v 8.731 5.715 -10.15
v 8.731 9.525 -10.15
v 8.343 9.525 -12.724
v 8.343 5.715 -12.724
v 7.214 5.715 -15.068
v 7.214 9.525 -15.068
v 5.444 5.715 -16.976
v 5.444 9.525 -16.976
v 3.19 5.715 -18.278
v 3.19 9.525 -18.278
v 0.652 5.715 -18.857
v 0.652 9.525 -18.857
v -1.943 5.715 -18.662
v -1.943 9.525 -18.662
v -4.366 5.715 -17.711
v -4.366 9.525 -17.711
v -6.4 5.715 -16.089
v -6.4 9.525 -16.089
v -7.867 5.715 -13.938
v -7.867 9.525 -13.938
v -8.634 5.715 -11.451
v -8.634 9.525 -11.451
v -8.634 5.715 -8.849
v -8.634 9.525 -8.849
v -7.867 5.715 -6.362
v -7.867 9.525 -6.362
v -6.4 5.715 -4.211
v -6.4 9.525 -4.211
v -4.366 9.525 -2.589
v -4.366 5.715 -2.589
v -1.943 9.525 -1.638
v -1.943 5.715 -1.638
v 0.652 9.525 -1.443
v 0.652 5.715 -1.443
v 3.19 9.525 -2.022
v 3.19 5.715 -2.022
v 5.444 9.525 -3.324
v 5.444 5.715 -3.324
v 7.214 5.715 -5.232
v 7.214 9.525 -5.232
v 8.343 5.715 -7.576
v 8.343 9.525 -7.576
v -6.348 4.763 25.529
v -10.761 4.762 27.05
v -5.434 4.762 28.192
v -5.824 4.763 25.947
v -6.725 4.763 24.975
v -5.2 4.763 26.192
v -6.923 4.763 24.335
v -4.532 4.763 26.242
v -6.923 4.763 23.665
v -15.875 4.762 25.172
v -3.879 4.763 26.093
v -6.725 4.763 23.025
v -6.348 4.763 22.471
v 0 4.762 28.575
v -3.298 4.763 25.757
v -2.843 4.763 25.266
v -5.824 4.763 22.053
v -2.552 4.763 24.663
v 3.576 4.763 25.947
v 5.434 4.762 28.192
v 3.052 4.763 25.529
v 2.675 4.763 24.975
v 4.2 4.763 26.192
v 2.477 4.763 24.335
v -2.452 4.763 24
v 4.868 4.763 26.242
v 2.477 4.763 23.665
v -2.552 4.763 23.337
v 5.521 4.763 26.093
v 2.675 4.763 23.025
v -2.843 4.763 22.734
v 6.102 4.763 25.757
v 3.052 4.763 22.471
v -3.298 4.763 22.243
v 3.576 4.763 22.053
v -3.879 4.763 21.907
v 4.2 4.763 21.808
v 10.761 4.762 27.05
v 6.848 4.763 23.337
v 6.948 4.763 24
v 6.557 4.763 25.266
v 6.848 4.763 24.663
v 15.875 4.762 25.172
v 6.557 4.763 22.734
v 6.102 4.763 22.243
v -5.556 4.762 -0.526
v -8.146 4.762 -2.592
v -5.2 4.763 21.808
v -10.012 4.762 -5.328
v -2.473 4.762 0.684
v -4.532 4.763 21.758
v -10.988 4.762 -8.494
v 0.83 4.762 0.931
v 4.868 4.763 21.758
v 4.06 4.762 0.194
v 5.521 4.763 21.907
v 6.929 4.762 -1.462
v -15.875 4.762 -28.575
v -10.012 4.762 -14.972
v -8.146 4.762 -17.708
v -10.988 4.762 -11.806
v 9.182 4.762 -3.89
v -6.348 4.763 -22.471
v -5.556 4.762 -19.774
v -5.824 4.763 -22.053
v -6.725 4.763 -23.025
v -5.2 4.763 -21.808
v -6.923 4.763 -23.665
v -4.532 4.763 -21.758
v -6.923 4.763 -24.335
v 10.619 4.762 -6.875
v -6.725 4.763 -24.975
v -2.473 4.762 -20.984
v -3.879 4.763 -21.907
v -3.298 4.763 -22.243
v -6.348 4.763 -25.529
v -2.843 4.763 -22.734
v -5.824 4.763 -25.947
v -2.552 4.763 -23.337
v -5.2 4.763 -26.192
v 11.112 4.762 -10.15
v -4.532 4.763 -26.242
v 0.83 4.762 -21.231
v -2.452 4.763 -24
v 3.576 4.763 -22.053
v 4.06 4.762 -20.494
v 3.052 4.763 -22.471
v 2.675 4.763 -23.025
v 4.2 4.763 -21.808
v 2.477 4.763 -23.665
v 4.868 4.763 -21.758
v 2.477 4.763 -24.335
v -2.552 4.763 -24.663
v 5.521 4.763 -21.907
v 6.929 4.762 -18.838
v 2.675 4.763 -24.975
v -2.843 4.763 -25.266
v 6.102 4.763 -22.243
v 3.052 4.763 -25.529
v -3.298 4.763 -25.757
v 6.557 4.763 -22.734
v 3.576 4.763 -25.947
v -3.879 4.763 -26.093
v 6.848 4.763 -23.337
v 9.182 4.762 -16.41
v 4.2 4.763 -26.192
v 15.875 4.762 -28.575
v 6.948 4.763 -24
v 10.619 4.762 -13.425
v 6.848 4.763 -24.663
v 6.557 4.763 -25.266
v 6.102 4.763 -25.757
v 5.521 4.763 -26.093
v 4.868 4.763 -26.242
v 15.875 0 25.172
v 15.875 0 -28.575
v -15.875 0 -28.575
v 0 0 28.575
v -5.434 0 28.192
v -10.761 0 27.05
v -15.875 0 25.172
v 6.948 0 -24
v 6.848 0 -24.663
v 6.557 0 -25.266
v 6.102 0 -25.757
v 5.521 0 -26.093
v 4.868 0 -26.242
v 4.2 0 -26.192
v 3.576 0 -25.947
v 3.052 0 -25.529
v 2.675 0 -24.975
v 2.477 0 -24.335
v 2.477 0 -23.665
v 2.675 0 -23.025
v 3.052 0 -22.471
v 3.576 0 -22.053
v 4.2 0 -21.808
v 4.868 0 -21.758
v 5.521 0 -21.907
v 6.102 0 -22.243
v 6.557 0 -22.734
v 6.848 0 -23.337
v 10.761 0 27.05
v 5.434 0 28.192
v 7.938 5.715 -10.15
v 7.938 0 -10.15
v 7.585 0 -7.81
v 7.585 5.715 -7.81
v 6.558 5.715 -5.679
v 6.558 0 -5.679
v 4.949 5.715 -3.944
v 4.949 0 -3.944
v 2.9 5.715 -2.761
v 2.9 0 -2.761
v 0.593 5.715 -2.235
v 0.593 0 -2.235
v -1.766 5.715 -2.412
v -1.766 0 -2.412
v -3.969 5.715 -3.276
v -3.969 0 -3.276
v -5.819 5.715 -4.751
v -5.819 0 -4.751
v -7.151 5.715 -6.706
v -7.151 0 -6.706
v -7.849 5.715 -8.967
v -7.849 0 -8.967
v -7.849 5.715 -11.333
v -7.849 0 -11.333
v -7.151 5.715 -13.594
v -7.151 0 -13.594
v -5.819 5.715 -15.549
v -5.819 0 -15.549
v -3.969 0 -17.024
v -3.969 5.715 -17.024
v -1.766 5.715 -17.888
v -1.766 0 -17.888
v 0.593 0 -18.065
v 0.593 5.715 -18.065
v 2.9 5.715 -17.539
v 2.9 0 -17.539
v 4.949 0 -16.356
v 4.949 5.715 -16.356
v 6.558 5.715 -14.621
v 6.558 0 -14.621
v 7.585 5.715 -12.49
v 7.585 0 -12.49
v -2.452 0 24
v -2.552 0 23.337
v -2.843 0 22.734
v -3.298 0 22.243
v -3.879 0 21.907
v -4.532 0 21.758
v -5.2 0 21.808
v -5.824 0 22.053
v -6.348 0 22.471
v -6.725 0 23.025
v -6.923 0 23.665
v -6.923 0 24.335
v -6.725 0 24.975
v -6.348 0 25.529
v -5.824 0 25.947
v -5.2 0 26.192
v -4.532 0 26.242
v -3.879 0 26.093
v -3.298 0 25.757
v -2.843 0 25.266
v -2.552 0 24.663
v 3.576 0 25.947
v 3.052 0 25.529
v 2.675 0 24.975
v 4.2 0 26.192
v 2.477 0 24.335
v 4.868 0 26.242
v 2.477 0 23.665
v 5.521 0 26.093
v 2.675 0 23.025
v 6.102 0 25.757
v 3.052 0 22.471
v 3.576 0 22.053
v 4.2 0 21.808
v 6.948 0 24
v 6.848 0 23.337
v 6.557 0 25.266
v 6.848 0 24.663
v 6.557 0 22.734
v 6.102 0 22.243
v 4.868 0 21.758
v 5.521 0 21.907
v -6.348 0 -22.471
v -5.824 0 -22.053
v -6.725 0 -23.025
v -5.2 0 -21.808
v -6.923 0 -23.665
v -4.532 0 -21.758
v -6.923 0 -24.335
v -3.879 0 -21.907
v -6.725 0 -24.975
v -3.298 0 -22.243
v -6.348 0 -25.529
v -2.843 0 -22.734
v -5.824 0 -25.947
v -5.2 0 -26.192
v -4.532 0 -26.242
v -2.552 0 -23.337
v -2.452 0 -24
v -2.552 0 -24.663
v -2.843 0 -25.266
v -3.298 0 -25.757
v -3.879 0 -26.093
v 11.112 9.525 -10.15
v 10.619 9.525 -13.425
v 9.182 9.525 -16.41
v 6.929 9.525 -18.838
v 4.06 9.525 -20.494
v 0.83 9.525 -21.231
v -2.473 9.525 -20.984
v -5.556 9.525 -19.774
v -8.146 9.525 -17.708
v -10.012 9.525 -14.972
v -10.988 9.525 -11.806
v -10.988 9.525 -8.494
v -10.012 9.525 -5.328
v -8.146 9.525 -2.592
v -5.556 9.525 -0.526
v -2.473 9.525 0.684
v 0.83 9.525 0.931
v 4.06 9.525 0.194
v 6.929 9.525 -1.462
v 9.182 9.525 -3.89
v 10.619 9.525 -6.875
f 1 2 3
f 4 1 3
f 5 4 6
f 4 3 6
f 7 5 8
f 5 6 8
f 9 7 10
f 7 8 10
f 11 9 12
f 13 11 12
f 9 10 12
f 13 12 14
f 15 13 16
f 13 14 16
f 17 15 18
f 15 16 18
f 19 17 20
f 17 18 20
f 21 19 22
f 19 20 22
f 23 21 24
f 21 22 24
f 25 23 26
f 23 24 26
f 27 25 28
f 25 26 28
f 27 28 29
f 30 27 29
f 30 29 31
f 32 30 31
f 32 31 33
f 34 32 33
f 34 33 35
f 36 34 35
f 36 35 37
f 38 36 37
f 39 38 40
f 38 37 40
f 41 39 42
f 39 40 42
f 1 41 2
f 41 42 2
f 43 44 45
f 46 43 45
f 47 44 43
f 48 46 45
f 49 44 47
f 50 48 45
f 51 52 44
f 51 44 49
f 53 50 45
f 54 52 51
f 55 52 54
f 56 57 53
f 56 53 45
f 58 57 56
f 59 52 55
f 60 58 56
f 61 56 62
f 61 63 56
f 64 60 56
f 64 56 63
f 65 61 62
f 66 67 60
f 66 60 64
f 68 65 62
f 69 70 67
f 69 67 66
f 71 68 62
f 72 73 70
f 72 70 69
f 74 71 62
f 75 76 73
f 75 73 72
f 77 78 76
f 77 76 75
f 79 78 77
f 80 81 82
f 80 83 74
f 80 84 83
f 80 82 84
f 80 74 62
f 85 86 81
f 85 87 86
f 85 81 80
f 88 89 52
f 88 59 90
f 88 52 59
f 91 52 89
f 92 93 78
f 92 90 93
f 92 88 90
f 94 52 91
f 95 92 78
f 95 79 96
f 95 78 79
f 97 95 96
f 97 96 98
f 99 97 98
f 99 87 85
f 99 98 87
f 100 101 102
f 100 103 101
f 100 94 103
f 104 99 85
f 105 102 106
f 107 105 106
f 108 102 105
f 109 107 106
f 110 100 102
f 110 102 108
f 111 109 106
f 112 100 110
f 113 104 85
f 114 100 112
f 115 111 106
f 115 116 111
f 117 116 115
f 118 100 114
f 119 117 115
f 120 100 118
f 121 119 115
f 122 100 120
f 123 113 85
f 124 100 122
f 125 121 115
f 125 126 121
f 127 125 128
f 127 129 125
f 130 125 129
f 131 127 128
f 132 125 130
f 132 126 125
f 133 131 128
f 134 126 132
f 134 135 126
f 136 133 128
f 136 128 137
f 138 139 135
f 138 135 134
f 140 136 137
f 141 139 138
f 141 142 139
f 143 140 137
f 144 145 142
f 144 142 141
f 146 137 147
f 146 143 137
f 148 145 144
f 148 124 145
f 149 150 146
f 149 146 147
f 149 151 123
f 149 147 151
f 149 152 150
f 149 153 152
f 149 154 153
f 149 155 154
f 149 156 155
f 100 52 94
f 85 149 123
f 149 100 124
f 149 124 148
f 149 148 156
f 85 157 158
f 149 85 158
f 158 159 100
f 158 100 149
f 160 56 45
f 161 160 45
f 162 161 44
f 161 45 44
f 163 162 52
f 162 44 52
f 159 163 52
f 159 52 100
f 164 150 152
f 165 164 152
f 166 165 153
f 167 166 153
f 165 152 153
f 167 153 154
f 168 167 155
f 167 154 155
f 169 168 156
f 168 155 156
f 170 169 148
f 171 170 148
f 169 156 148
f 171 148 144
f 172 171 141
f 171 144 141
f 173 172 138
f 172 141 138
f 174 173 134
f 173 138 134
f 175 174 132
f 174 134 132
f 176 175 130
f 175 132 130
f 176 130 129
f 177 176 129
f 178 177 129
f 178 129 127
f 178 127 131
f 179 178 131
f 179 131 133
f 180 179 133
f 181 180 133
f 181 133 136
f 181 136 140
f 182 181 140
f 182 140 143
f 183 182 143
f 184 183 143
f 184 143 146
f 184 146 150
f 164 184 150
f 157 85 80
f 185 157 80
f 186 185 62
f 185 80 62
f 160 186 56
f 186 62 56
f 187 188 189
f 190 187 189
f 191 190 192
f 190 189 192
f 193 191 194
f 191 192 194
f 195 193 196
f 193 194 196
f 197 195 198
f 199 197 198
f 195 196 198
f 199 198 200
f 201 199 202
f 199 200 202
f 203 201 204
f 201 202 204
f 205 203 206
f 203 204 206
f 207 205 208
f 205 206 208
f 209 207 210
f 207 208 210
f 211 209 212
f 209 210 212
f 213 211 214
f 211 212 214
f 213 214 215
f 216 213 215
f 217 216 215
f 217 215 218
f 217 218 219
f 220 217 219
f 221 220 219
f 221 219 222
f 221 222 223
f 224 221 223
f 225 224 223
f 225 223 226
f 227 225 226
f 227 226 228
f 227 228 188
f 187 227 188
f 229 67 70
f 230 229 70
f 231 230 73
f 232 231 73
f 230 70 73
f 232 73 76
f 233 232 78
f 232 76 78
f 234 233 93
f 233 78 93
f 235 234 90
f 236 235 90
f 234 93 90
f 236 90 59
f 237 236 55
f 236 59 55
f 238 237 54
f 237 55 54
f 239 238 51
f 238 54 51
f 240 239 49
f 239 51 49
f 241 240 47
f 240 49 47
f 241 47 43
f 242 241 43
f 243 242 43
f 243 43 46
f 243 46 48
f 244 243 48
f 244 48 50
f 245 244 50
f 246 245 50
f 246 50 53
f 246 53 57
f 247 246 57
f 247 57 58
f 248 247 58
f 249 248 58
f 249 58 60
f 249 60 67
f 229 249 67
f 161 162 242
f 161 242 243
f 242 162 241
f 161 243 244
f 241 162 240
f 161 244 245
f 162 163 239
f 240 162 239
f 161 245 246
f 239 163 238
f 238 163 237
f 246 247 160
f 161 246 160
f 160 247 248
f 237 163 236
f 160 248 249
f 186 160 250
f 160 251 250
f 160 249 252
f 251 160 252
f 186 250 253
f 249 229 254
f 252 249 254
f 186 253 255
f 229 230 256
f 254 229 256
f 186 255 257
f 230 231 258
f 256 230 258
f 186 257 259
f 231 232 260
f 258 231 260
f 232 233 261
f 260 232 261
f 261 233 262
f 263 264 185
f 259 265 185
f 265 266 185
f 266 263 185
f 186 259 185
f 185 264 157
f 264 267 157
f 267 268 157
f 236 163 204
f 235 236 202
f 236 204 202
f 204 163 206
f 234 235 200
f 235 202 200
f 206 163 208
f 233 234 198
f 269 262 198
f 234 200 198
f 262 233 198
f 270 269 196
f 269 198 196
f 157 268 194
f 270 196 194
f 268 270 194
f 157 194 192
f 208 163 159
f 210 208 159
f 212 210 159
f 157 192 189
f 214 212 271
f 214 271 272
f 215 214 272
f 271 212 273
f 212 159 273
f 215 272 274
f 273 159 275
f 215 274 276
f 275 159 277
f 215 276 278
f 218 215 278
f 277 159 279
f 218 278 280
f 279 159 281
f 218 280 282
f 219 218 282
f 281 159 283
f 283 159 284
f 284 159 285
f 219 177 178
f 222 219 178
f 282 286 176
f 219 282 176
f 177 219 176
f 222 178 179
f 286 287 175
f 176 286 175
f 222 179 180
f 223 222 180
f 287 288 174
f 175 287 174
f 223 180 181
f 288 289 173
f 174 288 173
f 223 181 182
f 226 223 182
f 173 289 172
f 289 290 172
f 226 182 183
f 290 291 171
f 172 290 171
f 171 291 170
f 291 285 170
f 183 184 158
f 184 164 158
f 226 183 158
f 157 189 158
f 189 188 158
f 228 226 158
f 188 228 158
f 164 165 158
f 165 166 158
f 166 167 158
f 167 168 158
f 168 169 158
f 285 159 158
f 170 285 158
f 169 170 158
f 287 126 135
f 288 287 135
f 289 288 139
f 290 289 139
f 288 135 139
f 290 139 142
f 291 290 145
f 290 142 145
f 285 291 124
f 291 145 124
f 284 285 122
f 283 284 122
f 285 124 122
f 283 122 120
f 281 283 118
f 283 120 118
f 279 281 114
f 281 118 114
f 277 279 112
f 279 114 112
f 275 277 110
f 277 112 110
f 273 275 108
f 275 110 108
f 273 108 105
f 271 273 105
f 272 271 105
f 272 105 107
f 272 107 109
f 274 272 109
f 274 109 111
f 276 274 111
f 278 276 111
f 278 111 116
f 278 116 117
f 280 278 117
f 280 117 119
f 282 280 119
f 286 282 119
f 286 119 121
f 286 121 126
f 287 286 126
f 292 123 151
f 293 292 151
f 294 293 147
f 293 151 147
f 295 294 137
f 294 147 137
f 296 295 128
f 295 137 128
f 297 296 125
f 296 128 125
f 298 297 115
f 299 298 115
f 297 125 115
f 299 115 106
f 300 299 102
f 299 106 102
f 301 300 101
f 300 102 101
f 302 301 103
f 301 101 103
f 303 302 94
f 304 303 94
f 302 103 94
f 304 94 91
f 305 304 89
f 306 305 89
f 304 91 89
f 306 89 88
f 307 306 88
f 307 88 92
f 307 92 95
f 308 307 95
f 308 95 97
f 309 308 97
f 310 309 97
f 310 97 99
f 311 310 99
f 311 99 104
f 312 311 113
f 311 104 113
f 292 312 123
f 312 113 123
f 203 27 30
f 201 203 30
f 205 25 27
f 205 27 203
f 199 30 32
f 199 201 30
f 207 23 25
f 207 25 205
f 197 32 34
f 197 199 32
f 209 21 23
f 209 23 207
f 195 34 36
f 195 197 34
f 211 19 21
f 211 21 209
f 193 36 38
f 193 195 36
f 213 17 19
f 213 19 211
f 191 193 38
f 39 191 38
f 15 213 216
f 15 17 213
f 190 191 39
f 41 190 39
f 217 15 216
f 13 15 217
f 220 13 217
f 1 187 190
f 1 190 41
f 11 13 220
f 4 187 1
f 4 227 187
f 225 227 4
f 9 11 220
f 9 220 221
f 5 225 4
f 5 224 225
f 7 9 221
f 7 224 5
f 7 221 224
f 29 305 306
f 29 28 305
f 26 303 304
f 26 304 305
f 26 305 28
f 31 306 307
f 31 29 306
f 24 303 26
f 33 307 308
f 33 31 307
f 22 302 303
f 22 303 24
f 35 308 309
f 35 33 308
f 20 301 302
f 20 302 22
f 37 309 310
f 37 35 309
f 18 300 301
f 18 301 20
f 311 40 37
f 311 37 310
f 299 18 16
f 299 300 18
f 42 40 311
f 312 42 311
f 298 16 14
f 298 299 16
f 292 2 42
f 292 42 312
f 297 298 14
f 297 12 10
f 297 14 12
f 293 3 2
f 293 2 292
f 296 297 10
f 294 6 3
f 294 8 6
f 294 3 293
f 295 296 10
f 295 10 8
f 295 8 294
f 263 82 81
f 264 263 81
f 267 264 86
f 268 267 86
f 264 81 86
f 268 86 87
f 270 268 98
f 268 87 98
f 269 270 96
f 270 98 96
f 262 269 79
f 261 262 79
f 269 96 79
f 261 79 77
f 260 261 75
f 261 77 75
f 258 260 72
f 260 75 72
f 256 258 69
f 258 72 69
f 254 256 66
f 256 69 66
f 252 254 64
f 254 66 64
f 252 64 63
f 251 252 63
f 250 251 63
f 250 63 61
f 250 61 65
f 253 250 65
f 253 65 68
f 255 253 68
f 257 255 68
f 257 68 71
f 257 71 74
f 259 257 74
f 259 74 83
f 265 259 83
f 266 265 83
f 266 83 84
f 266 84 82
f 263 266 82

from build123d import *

# Parameters (mm, degrees)
SKETCH1_W             = 31.75
SKETCH1_H             = 57.15
BOSS_EXTRUDE1_DEPTH   = 4.7625
SKETCH2_R             = 11.1125
BOSS_EXTRUDE2_DEPTH   = 4.7625
SKETCH3_R             = 8.73125
CUT_EXTRUDE1_DEPTH    = 3.81
SKETCH4_R             = 7.9375
CUT_EXTRUDE2_DEPTH    = 7.9375
F_8_CLEARANCE_HOLE2_D = 4.4958
CUT_EXTRUDE3_DEPTH    = 5.7625


with BuildPart() as part:
    # Sketch1 → Boss-Extrude1 (new body)
    with BuildSketch(Plane(origin=(0, 0, 0), x_dir=(1, 0, 0), z_dir=(0, 1, 0))):
        Rectangle(SKETCH1_W, SKETCH1_H)
    extrude(amount=BOSS_EXTRUDE1_DEPTH)

    # Sketch2 → Boss-Extrude2 (add)
    with BuildSketch(Plane(origin=(0, 4.7625, 0), x_dir=(1, 0, 0), z_dir=(0, 1, 0))):
        with Locations((0, 10.15000002)):
            Circle(SKETCH2_R)
    extrude(amount=BOSS_EXTRUDE2_DEPTH)

    # Sketch3 → Cut-Extrude1 (cut)
    with BuildSketch(Plane(origin=(0, 9.525, 0), x_dir=(1, 0, 0), z_dir=(0, 1, 0))):
        with Locations((0, 10.15000002)):
            Circle(SKETCH3_R)
    extrude(amount=-CUT_EXTRUDE1_DEPTH, mode=Mode.SUBTRACT)

    # Sketch4 → Cut-Extrude2 (cut)
    with BuildSketch(Plane.XZ):
        with Locations((0, -10.15000002)):
            Circle(SKETCH4_R)
    extrude(amount=-CUT_EXTRUDE2_DEPTH, mode=Mode.SUBTRACT)

    # #8 Clearance Hole2 (through all)
    with Locations(Plane(origin=(0, 0, 0), x_dir=(-1, 0, 0), z_dir=(0, -1, 0))):
        with Locations((-4.7, 24.00000002), (4.7, -23.99999998), (4.7, 24.00000002), (-4.7, -23.99999998)):
            Hole(F_8_CLEARANCE_HOLE2_D / 2)

    # Sketch8 → Cut-Extrude3 (cut, through all)
    with BuildSketch(Plane(origin=(0, 4.7625, 0), x_dir=(1, 0, 0), z_dir=(0, 1, 0))):
        with BuildLine():
            ThreePointArc((15.875, -25.171523185), (8.117870402, -27.7145719), (0, -28.575))
            Line((0, -28.575), (15.875, -28.575))
            Line((15.875, -28.575), (15.875, -25.171523185))
        make_face()
        with BuildLine():
            ThreePointArc((0, -28.575), (-8.117870402, -27.7145719), (-15.875, -25.171523185))
            Line((-15.875, -25.171523185), (-15.875, -28.575))
            Line((-15.875, -28.575), (0, -28.575))
        make_face()
    extrude(amount=-CUT_EXTRUDE3_DEPTH, mode=Mode.SUBTRACT)


solid = part.part
